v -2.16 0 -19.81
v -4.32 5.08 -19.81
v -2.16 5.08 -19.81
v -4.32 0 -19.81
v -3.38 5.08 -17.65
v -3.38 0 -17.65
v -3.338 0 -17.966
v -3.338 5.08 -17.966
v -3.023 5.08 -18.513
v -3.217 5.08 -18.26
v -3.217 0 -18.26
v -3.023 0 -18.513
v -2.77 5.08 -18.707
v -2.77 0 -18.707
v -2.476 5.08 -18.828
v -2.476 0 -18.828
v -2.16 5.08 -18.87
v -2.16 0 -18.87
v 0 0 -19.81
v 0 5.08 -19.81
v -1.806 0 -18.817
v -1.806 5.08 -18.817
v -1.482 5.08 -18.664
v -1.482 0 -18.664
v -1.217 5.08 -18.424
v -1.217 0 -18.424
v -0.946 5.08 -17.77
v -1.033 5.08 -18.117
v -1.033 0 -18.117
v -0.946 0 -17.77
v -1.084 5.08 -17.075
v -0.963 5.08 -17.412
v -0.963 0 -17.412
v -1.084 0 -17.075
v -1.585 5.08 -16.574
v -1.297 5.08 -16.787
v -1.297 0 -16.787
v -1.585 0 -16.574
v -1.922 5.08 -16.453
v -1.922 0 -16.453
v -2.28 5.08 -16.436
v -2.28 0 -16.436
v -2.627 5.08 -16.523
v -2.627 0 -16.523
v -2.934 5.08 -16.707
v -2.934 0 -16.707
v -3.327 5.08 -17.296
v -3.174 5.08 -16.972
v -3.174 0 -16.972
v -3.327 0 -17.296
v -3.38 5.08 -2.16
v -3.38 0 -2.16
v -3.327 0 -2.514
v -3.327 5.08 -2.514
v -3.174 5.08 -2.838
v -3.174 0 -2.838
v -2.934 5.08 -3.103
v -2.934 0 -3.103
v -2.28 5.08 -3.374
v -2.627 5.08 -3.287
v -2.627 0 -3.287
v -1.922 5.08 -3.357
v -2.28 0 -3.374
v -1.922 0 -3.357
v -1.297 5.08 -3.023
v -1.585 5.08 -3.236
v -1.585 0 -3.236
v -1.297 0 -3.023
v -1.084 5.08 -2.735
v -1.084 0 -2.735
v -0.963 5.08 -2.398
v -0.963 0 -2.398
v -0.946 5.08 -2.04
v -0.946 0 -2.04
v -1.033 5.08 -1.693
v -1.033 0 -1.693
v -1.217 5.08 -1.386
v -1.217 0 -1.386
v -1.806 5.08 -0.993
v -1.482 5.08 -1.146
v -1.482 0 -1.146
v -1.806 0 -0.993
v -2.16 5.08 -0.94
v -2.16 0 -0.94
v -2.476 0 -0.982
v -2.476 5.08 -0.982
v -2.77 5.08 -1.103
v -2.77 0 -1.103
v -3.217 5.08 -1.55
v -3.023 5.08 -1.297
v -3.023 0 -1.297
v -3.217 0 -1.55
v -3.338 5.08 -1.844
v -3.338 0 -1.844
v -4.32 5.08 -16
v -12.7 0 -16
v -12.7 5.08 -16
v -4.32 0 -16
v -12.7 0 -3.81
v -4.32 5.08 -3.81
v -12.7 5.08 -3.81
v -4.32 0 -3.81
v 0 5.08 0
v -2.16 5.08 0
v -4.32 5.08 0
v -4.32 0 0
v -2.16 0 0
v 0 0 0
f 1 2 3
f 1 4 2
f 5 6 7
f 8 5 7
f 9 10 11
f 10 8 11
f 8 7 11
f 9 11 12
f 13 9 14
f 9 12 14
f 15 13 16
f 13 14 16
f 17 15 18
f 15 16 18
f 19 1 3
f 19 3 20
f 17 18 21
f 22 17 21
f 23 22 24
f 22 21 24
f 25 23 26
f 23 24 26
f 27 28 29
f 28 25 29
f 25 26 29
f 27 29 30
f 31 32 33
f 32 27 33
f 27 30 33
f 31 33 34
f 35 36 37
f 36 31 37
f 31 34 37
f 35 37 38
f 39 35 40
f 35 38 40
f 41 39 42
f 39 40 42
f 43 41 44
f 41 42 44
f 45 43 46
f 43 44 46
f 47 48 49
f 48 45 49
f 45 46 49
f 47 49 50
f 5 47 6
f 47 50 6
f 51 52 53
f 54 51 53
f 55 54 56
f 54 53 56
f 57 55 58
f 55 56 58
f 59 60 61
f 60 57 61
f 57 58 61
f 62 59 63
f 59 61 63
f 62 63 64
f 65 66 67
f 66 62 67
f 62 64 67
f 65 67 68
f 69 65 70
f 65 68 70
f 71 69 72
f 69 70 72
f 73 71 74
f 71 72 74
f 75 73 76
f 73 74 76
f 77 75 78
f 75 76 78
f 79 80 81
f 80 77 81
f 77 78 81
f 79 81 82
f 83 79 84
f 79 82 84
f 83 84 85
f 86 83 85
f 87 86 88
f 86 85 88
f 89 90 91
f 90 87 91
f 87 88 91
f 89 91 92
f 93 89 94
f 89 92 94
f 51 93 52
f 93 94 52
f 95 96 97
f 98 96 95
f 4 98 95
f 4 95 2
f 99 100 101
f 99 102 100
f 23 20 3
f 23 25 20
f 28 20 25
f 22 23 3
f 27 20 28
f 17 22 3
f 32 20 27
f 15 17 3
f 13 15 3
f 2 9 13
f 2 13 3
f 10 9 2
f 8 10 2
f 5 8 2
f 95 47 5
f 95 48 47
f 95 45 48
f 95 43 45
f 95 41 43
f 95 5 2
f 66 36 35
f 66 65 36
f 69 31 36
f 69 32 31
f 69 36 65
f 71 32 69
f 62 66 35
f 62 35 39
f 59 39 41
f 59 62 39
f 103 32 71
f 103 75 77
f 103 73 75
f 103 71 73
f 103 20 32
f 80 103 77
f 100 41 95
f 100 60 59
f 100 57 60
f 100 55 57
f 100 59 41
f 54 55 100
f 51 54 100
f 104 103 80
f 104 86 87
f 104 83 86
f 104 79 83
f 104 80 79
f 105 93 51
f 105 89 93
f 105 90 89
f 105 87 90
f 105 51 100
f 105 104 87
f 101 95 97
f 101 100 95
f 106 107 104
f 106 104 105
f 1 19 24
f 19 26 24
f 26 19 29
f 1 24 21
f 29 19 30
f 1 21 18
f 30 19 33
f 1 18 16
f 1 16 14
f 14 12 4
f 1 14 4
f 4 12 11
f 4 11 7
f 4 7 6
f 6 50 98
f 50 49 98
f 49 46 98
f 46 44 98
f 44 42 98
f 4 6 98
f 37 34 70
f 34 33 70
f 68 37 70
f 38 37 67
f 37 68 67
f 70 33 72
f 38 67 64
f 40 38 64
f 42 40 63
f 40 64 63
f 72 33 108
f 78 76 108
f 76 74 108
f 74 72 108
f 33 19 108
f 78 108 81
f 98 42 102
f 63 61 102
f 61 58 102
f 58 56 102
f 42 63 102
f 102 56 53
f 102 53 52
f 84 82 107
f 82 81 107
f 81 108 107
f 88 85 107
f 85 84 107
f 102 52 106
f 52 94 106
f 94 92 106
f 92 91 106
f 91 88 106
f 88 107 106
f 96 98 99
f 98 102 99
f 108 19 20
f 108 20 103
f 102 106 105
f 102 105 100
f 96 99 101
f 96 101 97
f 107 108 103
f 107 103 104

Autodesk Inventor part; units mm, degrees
ref_plane "YZ Plane" through (0, 0, 0) normal (1, 0, 0) x (0, 1, 0)
ref_plane "XZ Plane" through (0, 0, 0) normal (0, 1, 0) x (-1, 0, 0)
ref_plane "XY Plane" through (0, 0, 0) normal (0, 0, 1) x (1, 0, 0)
sketch "Skizze1" plane through (0, 0, 0) normal (0, 1, 0) x (-1, 0, 0)
  line L0 (0, 0) -> (4.32, 0)
  line L1 (4.32, 0) -> (4.32, -3.81)
  line L2 (4.32, -3.81) -> (12.7, -3.81)
  line L3 (12.7, -3.81) -> (12.7, -16)
  line L4 (12.7, -16) -> (4.32, -16)
  line L5 (4.32, -16) -> (4.32, -19.81)
  line L6 (4.32, -19.81) -> (0, -19.81)
  line L7 (0, -19.81) -> (0, 0)
  line L8 (2.16, 0) -> (2.16, -2.16)
  line L9 (2.16, -19.81) -> (2.16, -17.65)
  circle A0 centre (2.16, -2.16) radius 1.22
  circle A1 centre (2.16, -17.65) radius 1.22
  dimension "d0" = 4.32
  dimension "d1" = 3.81
  dimension "d2" = 8.38
  dimension "d3" = 12.19
  dimension "d4" = 3.81
  dimension "d5" = 2.16
  dimension "d6" = 2.16
  dimension "d7" = 2.44
  dimension "d8" = 2.44
extrude "Extrusion1" add sketch "Skizze1" along normal blind 5.08
properties part number "OPB732" material "LCP-Kunststoff"
